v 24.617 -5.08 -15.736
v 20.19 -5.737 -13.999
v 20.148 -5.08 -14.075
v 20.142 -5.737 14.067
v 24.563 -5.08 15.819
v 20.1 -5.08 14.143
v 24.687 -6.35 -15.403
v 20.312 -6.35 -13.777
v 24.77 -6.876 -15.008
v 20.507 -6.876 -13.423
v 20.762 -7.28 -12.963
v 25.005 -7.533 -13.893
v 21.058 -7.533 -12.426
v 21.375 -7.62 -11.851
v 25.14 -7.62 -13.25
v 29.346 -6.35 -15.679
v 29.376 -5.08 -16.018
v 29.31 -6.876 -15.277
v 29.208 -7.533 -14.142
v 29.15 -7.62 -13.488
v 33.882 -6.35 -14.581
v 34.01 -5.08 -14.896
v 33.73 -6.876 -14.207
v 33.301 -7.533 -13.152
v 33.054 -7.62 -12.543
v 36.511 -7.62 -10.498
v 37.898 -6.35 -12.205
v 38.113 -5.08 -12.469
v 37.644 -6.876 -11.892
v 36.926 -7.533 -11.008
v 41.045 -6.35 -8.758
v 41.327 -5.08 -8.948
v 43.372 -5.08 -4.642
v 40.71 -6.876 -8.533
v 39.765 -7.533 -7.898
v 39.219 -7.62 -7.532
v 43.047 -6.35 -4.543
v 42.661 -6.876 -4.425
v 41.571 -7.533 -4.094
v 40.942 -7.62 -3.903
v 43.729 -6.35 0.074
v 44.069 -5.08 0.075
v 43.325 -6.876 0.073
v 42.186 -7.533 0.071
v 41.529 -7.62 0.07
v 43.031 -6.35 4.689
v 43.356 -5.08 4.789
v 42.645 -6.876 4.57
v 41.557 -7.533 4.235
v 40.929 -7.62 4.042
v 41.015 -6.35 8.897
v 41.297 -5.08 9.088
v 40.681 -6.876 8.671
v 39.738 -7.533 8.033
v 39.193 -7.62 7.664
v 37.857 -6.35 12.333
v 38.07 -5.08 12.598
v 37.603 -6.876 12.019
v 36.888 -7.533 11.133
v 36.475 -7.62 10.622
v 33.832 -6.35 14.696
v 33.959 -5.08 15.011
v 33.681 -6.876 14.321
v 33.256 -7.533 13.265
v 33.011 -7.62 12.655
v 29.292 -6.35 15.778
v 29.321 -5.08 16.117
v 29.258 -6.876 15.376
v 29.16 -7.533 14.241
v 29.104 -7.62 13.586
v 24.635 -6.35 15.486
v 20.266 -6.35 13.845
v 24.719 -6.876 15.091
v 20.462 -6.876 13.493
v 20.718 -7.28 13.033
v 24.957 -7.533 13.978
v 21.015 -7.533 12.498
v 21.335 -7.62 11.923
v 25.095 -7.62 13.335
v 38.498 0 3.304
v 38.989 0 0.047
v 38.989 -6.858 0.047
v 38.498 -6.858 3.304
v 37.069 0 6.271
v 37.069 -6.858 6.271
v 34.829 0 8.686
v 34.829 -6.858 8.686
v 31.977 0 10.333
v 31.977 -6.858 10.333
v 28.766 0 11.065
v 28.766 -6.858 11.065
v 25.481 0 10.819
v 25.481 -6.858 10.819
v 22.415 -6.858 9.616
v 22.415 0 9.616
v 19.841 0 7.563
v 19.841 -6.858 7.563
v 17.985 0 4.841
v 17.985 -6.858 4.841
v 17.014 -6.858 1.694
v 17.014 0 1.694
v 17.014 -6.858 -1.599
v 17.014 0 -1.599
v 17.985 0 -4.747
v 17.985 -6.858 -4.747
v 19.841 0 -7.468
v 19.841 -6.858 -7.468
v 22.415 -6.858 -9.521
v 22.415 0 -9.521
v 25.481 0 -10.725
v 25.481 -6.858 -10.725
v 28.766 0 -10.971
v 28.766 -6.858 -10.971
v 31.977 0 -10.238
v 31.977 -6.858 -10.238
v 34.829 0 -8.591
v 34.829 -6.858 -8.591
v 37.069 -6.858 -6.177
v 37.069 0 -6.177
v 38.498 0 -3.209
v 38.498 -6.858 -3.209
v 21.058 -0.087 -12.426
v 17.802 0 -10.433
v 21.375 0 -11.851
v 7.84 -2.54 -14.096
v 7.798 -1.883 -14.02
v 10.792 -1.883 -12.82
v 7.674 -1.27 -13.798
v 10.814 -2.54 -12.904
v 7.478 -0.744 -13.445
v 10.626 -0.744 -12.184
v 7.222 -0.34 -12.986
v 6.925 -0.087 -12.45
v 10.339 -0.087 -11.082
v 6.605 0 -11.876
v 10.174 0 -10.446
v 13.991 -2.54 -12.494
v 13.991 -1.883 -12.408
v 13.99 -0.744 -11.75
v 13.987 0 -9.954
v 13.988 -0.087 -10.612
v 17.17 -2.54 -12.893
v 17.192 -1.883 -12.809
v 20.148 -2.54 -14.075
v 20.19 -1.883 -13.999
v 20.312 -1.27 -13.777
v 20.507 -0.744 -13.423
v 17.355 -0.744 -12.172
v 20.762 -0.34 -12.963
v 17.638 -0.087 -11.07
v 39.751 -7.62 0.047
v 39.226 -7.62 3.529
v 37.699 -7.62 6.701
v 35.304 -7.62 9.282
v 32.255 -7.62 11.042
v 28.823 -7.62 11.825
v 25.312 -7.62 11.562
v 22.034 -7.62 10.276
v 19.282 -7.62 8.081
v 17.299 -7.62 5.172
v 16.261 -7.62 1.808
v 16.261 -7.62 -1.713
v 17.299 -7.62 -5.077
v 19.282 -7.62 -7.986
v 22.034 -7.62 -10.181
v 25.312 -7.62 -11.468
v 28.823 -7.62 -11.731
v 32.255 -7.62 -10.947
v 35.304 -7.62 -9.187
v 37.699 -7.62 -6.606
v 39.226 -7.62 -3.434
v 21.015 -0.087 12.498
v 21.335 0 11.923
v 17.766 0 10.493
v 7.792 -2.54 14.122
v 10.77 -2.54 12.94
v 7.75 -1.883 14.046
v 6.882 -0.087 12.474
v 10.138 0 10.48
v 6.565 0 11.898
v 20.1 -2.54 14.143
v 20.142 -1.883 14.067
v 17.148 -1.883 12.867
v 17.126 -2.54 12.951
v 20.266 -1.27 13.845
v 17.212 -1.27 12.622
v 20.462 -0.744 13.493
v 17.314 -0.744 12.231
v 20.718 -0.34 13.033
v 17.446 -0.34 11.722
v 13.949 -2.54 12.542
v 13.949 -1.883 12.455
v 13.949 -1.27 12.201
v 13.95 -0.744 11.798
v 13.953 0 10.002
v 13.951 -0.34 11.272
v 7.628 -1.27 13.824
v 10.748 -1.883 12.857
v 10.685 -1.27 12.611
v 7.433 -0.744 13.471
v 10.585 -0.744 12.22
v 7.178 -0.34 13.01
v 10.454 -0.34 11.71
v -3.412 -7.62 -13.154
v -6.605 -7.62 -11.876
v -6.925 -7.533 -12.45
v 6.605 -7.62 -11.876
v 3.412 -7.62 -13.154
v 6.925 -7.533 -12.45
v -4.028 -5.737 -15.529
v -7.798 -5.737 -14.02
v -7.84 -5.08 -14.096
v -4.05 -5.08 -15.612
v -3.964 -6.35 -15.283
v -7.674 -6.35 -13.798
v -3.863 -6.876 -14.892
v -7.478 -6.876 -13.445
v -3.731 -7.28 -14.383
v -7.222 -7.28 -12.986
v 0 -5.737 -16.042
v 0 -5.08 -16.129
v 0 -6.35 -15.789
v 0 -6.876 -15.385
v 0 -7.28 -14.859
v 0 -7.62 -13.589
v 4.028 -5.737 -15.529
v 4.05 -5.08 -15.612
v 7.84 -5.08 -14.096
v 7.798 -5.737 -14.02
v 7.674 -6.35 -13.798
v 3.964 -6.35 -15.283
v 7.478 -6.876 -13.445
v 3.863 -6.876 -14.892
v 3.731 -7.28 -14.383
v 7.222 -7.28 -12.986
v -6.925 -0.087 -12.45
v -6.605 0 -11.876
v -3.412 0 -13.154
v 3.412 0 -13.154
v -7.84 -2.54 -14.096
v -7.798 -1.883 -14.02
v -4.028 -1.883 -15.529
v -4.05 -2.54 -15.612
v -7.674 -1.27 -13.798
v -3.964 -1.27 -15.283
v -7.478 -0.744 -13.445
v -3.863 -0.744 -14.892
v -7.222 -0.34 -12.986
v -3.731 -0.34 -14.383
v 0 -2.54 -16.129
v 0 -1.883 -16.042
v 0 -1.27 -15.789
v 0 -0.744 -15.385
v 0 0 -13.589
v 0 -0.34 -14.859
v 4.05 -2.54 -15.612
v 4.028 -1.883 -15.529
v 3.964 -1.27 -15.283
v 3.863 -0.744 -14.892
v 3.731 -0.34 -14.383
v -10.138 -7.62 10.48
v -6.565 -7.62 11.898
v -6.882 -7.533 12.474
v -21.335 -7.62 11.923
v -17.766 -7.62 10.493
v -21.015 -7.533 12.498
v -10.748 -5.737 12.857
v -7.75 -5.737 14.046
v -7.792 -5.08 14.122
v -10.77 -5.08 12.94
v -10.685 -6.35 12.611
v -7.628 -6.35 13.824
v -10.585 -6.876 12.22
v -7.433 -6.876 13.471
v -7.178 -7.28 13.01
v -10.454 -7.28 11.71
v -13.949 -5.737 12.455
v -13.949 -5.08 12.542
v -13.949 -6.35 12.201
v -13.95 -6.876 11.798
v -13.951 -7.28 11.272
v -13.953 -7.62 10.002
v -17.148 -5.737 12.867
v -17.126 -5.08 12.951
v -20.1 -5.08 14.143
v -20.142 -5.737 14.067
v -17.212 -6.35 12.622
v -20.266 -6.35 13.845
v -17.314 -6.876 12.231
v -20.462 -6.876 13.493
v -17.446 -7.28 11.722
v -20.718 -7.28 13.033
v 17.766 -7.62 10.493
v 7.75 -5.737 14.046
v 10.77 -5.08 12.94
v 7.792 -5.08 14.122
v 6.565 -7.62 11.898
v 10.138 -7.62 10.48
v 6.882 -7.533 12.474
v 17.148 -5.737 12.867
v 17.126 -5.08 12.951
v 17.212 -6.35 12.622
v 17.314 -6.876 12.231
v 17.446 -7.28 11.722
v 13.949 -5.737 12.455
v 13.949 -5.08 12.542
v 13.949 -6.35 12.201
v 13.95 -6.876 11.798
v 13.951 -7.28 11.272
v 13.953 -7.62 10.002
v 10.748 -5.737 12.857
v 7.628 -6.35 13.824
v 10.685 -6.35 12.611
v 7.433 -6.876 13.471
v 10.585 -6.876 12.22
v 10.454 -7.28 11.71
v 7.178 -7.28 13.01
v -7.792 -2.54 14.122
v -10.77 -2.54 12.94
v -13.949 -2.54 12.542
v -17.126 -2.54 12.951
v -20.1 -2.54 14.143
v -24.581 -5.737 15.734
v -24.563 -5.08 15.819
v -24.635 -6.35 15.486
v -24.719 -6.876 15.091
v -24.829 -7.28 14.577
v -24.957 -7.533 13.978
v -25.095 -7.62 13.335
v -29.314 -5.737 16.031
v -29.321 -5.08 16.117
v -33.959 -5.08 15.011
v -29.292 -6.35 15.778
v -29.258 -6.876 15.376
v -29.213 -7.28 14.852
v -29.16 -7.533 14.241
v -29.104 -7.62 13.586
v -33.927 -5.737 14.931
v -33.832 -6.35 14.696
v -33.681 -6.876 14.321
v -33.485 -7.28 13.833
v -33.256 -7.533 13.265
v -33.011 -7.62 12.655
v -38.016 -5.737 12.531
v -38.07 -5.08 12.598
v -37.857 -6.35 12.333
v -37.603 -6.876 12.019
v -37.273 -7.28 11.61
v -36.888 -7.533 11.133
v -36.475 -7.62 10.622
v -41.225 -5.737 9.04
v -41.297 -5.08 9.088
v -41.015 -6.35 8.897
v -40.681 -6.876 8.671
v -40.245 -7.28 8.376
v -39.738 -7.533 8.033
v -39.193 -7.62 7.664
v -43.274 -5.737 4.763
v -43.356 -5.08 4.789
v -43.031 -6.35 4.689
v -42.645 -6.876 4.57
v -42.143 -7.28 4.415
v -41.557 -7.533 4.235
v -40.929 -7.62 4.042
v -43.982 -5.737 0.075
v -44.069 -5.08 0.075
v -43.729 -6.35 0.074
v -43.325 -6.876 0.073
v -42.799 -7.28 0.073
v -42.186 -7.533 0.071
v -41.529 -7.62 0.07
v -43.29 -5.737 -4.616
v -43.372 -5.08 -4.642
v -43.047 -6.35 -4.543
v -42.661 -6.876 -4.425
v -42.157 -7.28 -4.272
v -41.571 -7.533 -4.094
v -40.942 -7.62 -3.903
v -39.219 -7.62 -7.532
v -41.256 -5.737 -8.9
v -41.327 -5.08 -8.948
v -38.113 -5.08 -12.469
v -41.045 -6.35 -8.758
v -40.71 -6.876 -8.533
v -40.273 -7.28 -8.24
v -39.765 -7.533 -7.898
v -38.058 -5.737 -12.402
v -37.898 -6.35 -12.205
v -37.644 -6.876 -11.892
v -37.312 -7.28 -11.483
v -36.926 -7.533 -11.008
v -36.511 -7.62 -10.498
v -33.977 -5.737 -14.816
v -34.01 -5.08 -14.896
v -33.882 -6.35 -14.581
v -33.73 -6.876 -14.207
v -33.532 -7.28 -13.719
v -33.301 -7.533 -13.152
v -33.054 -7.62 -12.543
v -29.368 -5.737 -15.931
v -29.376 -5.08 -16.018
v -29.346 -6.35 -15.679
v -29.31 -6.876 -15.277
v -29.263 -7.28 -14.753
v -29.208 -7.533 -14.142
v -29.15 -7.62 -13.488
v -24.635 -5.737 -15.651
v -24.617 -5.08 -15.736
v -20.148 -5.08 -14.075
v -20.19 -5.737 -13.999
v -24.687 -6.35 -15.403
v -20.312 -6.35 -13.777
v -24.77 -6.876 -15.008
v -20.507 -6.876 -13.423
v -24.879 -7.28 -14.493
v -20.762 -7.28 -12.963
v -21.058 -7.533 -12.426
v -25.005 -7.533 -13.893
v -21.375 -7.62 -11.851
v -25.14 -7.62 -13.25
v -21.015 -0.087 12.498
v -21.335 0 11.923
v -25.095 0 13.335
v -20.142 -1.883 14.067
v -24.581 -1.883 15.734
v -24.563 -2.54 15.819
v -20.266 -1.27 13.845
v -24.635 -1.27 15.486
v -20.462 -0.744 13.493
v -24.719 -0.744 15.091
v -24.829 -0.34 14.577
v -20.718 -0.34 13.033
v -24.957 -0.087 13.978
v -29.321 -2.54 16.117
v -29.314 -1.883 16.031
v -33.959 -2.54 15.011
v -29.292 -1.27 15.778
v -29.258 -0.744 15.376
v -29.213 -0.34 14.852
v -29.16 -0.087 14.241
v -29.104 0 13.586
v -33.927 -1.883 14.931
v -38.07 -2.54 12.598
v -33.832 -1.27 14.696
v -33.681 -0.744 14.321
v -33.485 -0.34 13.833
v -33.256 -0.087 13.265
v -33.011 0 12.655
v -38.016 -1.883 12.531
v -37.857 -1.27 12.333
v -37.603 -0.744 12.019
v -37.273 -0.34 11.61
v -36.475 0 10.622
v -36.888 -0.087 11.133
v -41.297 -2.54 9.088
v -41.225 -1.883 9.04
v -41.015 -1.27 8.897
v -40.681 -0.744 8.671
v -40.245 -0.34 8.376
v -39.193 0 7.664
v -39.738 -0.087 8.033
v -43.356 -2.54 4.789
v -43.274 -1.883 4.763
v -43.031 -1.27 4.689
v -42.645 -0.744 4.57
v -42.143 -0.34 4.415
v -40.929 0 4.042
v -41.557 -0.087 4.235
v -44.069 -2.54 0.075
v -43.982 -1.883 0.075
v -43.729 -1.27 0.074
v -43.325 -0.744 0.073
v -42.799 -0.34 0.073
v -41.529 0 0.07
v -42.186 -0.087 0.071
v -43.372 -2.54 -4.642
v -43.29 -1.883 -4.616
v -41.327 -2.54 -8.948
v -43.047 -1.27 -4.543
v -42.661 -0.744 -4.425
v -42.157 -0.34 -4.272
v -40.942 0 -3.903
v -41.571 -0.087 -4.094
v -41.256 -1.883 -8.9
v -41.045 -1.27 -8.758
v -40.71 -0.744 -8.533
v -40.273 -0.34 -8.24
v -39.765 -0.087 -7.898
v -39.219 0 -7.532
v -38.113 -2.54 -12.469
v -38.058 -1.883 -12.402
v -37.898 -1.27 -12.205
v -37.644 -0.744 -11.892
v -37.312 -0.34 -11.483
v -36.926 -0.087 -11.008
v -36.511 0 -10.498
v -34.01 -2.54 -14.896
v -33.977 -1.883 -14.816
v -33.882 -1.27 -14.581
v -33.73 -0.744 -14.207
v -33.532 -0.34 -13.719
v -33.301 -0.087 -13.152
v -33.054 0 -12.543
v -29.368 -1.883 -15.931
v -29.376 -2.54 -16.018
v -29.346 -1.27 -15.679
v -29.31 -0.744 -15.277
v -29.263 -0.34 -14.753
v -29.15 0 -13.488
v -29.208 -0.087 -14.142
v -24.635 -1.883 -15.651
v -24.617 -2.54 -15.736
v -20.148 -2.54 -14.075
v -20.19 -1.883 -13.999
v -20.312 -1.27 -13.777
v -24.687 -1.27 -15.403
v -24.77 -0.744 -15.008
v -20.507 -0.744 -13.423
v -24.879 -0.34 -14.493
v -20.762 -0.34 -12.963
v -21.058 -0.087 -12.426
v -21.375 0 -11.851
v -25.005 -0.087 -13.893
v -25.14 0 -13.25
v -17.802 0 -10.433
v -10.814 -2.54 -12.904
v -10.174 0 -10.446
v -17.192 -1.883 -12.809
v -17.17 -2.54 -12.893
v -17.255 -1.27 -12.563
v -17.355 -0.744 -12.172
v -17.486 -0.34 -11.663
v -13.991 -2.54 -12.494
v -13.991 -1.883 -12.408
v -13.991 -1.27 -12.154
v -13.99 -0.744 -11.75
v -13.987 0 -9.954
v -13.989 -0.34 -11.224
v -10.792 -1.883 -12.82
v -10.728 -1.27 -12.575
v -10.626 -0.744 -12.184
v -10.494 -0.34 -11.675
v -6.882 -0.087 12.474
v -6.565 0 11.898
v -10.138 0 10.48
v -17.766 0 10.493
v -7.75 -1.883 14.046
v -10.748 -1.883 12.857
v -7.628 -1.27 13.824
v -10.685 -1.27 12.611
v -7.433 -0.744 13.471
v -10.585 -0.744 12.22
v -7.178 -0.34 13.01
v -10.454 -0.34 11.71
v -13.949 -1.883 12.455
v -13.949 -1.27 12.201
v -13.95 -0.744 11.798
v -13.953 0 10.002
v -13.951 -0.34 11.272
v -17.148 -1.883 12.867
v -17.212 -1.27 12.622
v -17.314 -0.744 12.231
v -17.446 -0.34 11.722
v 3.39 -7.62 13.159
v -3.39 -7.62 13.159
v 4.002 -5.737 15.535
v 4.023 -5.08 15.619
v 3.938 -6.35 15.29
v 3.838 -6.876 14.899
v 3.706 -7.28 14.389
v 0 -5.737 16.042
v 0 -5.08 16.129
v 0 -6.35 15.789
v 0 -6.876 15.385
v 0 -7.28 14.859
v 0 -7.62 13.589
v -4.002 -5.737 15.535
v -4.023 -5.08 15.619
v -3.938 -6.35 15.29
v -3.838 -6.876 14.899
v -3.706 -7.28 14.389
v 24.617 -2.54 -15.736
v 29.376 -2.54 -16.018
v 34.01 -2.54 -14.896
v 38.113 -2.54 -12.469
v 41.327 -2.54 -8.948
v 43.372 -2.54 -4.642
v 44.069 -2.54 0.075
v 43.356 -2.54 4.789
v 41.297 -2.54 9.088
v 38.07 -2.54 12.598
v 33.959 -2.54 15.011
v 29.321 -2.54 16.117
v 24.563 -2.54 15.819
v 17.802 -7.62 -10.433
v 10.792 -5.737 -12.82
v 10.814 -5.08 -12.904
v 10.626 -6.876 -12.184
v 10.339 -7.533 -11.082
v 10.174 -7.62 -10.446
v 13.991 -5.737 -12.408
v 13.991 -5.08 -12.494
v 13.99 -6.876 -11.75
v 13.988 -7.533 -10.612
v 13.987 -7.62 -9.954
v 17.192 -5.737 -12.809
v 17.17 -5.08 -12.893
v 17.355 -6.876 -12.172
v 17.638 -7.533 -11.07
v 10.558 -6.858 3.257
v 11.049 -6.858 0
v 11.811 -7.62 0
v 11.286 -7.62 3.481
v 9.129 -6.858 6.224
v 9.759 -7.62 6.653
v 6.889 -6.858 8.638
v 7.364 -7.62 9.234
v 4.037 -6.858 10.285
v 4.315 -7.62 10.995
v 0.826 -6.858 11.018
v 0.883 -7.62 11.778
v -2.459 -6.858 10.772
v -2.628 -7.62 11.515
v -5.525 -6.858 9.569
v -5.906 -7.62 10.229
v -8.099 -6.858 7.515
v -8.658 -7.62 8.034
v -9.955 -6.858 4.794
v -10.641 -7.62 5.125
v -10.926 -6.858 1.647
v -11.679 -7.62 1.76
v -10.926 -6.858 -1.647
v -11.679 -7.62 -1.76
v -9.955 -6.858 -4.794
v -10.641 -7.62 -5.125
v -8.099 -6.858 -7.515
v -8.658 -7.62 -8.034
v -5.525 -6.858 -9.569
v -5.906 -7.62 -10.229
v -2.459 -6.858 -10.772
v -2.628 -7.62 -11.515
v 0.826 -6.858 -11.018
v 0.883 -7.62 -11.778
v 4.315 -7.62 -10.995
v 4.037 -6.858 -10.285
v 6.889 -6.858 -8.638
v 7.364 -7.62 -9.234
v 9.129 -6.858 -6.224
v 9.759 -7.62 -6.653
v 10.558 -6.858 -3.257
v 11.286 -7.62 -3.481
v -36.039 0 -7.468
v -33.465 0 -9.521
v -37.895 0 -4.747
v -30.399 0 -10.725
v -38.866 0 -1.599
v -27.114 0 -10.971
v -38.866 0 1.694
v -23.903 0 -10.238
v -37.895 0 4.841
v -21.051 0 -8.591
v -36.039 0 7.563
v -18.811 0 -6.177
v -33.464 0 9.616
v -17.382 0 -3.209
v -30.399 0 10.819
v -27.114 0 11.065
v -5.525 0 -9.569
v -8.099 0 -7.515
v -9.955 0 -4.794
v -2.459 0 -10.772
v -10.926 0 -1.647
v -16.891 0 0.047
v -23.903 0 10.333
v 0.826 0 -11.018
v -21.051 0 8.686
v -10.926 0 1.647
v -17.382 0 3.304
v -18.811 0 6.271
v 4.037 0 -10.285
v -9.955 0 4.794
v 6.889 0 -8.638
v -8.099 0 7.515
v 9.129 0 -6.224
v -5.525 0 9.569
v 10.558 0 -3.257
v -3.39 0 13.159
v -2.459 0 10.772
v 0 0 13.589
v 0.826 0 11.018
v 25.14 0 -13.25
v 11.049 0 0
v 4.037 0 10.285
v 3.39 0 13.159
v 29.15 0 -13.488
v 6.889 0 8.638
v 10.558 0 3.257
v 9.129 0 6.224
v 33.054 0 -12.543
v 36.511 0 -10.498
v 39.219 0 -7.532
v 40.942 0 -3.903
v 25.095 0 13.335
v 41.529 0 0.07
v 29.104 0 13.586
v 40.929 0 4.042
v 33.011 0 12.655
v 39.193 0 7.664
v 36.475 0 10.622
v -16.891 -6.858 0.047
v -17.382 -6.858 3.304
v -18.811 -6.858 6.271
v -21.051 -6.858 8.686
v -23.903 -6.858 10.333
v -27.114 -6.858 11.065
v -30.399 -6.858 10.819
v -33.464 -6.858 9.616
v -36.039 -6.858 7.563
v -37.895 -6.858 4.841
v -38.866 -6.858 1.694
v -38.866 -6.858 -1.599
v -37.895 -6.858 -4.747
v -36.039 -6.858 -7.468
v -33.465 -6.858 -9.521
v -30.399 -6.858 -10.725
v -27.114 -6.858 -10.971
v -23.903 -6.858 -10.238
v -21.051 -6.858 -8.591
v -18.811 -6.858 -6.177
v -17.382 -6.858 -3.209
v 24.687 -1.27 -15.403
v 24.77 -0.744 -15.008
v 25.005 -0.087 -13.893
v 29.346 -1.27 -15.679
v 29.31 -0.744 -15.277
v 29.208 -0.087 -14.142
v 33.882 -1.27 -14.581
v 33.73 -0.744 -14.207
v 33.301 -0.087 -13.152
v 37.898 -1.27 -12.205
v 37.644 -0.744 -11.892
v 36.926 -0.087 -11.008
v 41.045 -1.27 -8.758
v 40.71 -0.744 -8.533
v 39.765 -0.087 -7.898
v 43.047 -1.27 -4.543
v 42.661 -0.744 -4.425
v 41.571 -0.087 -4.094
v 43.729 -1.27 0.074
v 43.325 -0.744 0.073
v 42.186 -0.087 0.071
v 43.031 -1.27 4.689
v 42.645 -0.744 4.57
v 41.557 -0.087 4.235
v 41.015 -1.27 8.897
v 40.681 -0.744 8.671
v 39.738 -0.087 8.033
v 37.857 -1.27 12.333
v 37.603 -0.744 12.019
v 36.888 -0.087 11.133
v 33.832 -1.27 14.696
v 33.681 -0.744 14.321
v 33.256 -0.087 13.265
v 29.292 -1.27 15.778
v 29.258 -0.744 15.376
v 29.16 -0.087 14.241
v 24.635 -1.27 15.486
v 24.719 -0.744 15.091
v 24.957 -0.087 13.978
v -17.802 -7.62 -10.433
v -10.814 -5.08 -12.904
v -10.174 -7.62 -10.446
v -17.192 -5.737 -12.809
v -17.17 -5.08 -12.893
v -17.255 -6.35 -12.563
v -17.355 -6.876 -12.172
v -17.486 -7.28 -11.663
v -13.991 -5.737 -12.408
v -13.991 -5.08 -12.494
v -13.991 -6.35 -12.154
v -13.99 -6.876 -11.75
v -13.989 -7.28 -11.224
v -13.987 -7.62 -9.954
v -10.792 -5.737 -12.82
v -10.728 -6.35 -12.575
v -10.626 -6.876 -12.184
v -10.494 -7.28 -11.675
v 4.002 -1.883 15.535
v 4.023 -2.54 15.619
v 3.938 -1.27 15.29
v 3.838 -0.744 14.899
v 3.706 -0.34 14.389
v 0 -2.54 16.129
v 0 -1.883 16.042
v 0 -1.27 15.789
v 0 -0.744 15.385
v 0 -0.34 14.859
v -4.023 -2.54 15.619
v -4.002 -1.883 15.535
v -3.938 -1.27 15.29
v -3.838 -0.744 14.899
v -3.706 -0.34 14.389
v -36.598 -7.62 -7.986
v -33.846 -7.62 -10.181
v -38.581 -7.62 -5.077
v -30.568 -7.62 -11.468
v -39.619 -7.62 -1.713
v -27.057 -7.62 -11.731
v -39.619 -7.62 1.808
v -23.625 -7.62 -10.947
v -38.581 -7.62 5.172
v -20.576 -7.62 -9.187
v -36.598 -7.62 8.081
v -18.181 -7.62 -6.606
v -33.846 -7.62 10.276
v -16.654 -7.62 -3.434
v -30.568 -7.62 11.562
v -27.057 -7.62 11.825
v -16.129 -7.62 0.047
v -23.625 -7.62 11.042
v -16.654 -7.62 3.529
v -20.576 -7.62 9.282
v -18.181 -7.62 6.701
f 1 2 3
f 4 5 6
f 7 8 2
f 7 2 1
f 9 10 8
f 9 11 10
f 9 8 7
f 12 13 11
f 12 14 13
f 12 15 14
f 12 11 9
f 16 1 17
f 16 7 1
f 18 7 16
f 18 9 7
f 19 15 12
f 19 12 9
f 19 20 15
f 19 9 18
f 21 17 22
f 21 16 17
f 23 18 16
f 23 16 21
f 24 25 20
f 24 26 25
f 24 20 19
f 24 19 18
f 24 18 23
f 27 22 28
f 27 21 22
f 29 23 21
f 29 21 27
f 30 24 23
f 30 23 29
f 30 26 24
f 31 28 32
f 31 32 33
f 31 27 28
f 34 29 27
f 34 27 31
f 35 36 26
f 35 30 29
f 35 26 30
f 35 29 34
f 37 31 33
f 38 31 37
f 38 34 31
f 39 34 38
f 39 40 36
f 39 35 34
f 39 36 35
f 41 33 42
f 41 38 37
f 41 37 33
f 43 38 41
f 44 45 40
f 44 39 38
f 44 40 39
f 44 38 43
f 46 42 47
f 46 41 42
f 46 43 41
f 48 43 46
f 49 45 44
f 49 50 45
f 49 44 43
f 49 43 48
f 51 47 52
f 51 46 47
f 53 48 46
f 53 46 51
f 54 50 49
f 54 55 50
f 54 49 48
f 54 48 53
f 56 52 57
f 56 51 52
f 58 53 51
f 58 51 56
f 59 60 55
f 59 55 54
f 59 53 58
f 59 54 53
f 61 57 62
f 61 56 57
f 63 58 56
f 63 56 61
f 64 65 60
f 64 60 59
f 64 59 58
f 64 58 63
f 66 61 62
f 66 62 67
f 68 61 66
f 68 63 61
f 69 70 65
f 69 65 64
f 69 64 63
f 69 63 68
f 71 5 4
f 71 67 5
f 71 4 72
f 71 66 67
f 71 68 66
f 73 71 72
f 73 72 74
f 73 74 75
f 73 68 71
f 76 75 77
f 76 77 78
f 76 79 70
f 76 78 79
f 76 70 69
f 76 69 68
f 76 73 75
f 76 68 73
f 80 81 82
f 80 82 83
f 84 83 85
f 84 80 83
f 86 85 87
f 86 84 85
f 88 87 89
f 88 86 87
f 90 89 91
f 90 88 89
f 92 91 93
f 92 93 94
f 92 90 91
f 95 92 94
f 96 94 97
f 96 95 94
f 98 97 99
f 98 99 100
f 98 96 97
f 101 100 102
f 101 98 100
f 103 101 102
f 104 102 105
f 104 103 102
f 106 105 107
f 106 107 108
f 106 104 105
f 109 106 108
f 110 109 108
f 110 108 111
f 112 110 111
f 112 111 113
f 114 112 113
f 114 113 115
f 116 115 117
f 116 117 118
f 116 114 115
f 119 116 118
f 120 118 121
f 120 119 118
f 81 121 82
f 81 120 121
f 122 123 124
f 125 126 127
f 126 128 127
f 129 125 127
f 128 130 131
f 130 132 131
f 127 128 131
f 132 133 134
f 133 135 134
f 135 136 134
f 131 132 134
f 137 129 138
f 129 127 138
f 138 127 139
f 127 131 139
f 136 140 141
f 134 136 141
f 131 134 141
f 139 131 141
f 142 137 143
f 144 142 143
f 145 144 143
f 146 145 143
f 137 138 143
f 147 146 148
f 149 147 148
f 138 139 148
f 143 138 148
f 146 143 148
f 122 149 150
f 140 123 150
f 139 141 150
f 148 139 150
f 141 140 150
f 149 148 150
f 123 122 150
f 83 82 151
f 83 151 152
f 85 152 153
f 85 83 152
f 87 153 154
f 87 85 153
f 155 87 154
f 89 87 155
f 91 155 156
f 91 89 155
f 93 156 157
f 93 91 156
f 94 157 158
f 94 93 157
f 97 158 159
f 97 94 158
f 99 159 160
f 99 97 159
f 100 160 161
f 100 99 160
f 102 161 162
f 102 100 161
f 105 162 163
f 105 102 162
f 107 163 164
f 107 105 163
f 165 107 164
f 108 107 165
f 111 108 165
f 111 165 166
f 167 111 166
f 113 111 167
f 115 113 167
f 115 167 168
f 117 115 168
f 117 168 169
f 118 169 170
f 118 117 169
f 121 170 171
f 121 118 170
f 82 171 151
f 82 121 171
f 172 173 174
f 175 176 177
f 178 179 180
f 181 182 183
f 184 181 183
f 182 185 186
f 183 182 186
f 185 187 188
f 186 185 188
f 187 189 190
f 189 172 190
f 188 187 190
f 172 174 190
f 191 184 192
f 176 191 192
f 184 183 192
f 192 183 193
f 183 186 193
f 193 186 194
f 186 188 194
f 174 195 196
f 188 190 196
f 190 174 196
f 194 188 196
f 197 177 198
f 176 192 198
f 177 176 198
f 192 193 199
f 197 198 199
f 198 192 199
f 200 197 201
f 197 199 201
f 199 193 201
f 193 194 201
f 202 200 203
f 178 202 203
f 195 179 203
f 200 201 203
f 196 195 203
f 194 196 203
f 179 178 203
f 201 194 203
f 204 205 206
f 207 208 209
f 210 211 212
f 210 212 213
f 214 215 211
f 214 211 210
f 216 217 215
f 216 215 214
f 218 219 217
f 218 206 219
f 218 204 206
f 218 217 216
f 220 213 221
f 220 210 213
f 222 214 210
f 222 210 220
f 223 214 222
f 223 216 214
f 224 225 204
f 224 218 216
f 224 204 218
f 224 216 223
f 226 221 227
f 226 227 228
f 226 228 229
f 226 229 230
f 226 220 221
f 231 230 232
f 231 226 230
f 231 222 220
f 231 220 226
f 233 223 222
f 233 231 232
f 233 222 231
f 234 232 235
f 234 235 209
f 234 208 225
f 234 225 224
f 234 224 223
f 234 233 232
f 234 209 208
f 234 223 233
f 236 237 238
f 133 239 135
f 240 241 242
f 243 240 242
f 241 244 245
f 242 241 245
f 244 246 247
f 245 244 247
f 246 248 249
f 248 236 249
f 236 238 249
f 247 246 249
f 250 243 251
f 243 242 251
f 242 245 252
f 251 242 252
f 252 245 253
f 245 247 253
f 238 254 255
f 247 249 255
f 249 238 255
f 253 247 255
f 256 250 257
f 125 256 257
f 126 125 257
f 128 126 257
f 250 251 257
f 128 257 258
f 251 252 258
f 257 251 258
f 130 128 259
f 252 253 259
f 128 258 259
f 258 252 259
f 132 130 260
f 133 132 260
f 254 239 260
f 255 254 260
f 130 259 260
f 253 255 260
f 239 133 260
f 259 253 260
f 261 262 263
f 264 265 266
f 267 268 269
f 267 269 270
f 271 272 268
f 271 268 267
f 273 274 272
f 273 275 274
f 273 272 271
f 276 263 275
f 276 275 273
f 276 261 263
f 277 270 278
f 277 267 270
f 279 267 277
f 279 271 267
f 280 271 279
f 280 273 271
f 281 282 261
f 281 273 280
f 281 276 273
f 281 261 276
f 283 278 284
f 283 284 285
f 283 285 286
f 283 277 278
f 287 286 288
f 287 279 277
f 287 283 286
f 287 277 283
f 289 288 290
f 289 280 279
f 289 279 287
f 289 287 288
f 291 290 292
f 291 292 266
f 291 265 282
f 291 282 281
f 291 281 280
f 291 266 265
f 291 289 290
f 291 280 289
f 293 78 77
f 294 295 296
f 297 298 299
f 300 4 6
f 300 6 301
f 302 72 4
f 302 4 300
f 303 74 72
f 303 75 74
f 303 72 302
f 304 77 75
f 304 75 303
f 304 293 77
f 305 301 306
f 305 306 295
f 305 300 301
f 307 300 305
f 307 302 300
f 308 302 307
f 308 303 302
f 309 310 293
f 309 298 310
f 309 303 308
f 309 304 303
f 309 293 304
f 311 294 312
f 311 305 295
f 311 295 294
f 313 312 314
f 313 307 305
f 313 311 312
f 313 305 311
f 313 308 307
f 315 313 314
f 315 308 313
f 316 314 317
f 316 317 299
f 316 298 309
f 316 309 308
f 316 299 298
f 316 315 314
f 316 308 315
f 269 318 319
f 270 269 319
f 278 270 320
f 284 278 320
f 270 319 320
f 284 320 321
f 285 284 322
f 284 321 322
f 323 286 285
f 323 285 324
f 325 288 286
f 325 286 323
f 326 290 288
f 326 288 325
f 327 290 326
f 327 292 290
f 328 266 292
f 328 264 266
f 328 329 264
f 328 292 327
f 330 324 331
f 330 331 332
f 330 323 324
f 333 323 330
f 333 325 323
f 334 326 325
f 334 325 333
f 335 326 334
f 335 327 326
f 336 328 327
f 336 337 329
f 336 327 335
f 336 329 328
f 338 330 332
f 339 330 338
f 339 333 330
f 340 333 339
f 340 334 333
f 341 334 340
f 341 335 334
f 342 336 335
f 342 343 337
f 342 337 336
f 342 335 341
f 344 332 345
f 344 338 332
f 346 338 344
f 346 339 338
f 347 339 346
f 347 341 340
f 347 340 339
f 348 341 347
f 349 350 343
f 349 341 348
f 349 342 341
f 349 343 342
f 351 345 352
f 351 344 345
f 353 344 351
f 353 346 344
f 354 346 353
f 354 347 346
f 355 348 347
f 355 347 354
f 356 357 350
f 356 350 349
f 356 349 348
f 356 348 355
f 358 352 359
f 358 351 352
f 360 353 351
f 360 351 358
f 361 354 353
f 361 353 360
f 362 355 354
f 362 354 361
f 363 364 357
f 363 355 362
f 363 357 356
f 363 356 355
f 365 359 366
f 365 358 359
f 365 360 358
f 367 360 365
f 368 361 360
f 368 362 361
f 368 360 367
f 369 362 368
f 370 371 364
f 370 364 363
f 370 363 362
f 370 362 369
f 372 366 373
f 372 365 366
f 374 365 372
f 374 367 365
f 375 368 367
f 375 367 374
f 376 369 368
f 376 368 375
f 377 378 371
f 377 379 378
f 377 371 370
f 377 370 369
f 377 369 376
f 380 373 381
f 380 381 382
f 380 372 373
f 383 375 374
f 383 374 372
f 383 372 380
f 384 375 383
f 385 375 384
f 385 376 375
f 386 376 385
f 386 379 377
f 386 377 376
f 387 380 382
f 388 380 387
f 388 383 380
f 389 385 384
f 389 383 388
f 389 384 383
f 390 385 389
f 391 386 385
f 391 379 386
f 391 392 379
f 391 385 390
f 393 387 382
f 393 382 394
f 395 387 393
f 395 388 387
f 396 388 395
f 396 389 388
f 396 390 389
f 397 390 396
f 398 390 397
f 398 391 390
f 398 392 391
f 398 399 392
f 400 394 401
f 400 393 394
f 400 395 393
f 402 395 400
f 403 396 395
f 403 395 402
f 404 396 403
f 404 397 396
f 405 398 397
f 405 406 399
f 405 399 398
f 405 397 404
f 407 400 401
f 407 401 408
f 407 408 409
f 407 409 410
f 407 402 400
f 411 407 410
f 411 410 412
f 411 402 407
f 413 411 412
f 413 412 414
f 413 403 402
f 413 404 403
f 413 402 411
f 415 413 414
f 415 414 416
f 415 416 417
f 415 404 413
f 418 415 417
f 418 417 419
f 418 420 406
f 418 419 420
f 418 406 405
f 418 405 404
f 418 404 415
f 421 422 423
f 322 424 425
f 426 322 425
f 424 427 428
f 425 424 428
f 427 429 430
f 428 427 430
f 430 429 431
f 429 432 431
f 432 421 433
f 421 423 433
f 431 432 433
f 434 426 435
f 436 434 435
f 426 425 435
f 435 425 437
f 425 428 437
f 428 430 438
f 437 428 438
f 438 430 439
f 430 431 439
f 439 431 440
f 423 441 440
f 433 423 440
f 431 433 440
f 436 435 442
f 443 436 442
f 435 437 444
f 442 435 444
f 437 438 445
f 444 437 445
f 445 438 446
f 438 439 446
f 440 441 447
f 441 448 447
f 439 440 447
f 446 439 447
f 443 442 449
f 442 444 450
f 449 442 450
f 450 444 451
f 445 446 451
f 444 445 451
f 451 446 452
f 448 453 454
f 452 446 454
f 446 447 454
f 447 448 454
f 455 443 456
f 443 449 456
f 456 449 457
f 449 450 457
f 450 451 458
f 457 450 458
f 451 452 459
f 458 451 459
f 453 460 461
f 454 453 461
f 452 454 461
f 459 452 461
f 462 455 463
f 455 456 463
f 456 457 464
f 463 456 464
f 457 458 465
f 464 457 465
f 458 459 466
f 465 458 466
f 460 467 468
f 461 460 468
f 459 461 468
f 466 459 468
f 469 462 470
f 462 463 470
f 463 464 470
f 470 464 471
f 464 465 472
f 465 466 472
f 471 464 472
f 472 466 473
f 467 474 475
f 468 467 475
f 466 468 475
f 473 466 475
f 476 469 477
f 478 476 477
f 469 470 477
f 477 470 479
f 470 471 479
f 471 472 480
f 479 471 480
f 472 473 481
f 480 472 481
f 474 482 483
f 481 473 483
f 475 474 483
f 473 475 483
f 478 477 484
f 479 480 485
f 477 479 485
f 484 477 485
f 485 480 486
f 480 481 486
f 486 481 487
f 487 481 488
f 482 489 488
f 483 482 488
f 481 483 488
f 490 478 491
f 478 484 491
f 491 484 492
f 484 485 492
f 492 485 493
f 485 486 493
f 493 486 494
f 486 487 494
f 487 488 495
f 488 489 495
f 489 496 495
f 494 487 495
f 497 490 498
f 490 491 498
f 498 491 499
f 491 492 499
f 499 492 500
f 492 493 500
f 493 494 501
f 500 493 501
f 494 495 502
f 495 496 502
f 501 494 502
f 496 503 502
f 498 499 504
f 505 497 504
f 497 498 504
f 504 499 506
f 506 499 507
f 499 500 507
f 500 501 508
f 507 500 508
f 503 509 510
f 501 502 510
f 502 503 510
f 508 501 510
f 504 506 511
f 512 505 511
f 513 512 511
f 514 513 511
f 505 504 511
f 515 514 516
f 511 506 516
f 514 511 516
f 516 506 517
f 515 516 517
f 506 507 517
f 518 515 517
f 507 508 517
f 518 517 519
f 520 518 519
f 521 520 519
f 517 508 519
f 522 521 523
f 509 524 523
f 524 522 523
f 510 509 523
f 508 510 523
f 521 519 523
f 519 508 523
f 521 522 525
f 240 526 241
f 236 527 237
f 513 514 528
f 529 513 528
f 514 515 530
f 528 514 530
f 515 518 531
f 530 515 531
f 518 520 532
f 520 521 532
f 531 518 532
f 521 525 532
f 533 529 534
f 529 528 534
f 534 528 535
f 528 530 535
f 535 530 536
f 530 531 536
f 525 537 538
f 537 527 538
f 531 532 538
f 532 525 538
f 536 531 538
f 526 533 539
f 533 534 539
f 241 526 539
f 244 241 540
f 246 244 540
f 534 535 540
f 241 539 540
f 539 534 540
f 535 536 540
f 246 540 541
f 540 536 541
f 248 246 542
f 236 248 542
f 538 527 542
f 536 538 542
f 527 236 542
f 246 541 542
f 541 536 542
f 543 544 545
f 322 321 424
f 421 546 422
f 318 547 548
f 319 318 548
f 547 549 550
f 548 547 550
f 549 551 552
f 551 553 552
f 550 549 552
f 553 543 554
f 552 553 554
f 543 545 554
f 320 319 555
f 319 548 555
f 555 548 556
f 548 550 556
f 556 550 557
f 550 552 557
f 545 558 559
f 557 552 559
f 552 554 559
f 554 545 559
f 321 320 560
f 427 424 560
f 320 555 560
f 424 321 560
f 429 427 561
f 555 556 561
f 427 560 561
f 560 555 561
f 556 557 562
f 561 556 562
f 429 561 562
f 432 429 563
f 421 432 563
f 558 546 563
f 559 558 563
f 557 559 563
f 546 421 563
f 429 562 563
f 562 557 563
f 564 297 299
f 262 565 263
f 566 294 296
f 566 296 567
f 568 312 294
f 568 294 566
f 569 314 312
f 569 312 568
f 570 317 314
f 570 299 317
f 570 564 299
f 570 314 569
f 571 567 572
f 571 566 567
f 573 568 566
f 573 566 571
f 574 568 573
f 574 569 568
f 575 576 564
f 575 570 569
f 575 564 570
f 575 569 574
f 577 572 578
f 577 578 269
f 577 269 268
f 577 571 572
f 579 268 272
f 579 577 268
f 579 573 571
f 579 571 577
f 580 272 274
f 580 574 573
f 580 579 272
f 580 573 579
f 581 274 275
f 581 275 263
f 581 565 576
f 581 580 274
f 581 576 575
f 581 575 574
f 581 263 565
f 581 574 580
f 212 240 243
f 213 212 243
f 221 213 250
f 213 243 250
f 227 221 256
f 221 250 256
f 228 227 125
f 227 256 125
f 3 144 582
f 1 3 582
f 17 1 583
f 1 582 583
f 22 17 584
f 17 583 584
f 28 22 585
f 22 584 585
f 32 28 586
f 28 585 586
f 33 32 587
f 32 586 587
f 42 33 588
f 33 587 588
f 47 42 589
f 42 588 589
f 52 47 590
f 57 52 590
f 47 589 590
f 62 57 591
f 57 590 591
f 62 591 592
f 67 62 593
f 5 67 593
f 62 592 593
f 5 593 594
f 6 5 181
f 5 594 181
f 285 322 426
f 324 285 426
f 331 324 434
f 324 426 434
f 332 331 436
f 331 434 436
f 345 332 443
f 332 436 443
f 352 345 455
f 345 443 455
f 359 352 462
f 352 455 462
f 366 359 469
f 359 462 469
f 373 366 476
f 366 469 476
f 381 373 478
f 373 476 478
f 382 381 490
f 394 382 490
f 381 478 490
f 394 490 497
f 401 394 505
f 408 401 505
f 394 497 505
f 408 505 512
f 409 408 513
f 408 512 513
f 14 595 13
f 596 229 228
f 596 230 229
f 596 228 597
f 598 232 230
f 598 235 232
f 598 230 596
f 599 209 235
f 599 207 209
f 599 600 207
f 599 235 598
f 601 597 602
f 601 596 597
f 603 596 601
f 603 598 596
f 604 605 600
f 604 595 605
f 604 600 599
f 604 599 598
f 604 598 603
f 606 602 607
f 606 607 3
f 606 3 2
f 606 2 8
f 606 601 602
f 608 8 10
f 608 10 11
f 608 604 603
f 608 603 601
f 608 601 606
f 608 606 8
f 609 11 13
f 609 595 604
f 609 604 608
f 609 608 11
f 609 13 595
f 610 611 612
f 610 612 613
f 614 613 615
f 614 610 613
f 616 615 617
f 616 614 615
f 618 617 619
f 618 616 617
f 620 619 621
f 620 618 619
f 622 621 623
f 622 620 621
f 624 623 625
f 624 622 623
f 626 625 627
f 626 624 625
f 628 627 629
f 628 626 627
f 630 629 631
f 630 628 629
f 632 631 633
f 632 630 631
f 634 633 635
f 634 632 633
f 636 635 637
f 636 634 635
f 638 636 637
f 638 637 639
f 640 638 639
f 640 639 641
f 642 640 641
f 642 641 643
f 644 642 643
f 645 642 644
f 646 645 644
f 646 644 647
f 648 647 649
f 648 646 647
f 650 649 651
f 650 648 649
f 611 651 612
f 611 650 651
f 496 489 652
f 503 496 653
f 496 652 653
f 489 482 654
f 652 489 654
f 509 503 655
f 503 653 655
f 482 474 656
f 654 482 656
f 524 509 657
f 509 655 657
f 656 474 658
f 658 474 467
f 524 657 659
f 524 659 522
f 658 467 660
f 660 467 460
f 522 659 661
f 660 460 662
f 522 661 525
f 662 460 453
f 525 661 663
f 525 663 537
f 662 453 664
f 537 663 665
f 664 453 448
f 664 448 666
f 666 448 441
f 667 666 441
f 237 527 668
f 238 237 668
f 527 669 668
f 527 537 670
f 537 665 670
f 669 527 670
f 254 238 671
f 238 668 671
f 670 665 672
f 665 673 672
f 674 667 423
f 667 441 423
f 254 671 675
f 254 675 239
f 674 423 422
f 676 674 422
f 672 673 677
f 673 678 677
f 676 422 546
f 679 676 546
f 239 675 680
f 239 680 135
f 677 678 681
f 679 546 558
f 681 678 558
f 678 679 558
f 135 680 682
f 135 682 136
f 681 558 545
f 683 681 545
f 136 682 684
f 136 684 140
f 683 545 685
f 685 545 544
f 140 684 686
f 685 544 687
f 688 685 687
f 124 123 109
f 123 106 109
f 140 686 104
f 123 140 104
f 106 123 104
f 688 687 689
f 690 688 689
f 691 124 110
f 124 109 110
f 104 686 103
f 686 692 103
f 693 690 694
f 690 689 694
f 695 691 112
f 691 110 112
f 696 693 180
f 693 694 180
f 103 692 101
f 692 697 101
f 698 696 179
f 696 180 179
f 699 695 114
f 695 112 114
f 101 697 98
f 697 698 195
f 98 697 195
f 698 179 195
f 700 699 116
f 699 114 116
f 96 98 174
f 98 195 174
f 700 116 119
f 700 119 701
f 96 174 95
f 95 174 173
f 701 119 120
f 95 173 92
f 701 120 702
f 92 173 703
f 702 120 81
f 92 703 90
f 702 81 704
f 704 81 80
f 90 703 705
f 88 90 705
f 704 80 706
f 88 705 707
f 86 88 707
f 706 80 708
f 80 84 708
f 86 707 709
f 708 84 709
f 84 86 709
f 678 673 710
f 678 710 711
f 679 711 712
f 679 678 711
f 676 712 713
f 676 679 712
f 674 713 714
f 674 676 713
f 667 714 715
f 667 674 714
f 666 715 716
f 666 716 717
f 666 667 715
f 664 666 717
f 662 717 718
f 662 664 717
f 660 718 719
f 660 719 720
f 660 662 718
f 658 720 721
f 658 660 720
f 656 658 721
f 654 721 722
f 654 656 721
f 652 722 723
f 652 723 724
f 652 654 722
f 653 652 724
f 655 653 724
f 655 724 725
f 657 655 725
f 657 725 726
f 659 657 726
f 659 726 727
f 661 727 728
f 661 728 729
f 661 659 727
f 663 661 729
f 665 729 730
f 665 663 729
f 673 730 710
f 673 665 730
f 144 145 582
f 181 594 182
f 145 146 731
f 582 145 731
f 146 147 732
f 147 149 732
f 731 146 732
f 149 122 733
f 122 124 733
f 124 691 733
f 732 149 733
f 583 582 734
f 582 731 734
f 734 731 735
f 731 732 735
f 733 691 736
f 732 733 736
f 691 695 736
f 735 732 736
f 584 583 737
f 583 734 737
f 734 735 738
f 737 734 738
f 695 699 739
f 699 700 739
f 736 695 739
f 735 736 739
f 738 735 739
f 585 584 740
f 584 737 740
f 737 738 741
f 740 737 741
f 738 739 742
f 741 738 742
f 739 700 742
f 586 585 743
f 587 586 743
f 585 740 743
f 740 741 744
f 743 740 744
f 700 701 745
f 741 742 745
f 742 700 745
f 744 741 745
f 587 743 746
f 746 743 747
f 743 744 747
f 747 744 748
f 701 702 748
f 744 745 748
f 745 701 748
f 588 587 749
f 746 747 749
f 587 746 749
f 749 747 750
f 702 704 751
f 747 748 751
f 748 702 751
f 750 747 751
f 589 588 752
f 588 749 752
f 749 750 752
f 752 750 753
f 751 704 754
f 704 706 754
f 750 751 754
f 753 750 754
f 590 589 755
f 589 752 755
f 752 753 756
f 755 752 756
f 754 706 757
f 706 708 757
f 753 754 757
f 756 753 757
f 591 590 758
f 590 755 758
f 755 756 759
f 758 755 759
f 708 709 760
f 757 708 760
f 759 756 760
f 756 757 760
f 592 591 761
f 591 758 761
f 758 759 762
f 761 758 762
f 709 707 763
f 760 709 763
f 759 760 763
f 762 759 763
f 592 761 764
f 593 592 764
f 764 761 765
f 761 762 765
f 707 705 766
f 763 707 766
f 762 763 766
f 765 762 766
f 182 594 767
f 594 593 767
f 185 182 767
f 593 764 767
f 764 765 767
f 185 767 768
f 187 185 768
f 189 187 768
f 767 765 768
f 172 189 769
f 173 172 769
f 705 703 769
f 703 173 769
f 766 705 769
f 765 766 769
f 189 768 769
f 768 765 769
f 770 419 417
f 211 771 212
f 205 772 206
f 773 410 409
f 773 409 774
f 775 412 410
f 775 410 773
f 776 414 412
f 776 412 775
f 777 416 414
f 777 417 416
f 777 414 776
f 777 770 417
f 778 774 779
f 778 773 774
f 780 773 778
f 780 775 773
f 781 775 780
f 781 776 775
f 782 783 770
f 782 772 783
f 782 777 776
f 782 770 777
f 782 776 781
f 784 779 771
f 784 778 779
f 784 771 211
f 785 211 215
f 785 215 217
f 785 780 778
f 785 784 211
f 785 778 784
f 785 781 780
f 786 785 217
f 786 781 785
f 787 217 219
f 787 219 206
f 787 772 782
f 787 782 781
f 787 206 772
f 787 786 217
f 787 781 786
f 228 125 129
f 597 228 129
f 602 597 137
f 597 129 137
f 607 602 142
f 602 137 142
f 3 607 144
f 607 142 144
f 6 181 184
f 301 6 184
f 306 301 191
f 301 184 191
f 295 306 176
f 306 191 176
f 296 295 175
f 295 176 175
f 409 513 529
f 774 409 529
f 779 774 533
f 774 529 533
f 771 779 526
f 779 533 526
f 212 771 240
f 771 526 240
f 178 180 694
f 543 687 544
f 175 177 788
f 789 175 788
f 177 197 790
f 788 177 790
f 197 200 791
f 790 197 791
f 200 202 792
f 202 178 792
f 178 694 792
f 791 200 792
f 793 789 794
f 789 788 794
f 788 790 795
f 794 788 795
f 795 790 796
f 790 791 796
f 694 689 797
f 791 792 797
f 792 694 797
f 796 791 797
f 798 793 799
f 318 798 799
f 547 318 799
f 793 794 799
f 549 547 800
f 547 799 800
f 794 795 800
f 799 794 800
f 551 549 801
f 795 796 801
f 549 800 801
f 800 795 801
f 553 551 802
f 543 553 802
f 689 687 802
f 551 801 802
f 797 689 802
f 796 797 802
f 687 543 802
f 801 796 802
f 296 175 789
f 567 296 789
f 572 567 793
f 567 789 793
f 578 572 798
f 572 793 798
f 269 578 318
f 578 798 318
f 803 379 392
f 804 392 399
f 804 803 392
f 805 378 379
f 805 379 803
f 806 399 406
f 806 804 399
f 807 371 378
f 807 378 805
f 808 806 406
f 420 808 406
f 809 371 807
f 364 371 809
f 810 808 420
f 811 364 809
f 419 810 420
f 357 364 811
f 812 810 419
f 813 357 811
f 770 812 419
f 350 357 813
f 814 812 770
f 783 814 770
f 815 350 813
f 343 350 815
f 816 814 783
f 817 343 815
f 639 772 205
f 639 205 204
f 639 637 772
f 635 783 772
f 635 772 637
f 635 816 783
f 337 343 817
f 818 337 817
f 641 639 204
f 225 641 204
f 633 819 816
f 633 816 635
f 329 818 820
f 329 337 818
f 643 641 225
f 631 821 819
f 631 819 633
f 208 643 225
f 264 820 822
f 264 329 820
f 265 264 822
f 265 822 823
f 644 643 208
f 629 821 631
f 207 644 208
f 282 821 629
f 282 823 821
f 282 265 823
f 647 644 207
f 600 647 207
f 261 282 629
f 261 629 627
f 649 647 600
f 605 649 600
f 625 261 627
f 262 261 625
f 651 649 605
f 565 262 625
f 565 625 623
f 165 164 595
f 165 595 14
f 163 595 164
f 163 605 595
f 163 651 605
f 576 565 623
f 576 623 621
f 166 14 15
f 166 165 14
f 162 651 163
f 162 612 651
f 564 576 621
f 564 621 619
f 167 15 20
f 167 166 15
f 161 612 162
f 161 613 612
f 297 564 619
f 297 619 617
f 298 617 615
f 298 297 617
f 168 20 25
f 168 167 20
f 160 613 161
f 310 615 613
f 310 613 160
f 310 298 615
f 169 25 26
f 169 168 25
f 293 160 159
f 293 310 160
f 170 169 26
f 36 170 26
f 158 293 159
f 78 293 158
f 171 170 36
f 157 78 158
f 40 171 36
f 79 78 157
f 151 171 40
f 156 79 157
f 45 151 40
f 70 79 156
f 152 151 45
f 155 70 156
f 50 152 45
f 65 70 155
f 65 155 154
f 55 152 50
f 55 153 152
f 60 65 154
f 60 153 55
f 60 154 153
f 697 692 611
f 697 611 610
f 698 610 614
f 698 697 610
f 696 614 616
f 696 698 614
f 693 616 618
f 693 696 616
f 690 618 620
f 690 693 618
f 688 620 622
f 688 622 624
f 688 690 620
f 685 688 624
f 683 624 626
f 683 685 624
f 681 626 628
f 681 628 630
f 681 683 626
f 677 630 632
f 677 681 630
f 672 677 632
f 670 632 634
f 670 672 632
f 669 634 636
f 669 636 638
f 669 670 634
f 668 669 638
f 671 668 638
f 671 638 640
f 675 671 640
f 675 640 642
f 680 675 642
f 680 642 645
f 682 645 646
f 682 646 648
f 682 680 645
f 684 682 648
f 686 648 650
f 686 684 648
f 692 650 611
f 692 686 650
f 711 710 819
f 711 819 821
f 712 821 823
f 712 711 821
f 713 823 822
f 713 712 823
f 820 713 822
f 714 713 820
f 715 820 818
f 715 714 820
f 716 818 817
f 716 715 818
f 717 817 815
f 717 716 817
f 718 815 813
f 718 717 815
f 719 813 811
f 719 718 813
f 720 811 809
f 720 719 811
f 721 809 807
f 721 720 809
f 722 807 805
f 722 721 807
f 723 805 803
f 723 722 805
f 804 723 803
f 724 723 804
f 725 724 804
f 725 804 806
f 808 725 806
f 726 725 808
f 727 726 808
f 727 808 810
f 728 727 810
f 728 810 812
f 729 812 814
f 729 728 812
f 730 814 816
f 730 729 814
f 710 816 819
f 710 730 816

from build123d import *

# Parameters (mm, degrees)
F0_R     = 11.049
F1_DEPTH = 7.62
F2_R     = 2.54
F3_SIZE  = 0.762


with BuildPart() as f1:
    # F0 (on Front) → F1 (new body)
    with BuildSketch(Plane.XZ):
        with BuildLine():
            ThreePointArc((-20.148096, -14.074648), (-13.991215, -12.494351), (-7.839726, -14.095508))
            ThreePointArc((-7.839726, -14.095508), (0, -16.129), (7.839726, -14.095508))
            ThreePointArc((7.839726, -14.095508), (13.991215, -12.494351), (20.148096, -14.074648))
            ThreePointArc((20.148096, -14.074648), (44.068977, 0.074687), (20.100274, 14.142859))
            ThreePointArc((20.100274, 14.142859), (13.948785, 12.541703), (7.791904, 14.122))
            ThreePointArc((7.791904, 14.122), (0, 16.129), (-7.791904, 14.122))
            ThreePointArc((-7.791904, 14.122), (-13.948785, 12.541703), (-20.100274, 14.142859))
            ThreePointArc((-20.100274, 14.142859), (-44.068977, 0.074687), (-20.148096, -14.074648))
        make_face()
        Circle(F0_R, mode=Mode.SUBTRACT)
        with Locations((-27.94, 0.047352)):
            Circle(F0_R, mode=Mode.SUBTRACT)
        with Locations((27.94, 0.047352)):
            Circle(F0_R, mode=Mode.SUBTRACT)
    extrude(amount=F1_DEPTH)

    # F2
    f2_edges = [f1.edges().sort_by_distance(p)[0] for p in [
        (44.068977, -7.62, 0.074687),
        (44.068977, 0, 0.074687),
    ]]
    fillet(f2_edges, radius=F2_R)

    # F3
    f3_edges = [f1.edges().sort_by_distance(p)[0] for p in [
        (-38.989, -7.62, 0.047352),
        (-11.049, -7.62, 0),
        (16.891, -7.62, 0.047352),
    ]]
    chamfer(f3_edges, length=F3_SIZE)


solid = f1.part
